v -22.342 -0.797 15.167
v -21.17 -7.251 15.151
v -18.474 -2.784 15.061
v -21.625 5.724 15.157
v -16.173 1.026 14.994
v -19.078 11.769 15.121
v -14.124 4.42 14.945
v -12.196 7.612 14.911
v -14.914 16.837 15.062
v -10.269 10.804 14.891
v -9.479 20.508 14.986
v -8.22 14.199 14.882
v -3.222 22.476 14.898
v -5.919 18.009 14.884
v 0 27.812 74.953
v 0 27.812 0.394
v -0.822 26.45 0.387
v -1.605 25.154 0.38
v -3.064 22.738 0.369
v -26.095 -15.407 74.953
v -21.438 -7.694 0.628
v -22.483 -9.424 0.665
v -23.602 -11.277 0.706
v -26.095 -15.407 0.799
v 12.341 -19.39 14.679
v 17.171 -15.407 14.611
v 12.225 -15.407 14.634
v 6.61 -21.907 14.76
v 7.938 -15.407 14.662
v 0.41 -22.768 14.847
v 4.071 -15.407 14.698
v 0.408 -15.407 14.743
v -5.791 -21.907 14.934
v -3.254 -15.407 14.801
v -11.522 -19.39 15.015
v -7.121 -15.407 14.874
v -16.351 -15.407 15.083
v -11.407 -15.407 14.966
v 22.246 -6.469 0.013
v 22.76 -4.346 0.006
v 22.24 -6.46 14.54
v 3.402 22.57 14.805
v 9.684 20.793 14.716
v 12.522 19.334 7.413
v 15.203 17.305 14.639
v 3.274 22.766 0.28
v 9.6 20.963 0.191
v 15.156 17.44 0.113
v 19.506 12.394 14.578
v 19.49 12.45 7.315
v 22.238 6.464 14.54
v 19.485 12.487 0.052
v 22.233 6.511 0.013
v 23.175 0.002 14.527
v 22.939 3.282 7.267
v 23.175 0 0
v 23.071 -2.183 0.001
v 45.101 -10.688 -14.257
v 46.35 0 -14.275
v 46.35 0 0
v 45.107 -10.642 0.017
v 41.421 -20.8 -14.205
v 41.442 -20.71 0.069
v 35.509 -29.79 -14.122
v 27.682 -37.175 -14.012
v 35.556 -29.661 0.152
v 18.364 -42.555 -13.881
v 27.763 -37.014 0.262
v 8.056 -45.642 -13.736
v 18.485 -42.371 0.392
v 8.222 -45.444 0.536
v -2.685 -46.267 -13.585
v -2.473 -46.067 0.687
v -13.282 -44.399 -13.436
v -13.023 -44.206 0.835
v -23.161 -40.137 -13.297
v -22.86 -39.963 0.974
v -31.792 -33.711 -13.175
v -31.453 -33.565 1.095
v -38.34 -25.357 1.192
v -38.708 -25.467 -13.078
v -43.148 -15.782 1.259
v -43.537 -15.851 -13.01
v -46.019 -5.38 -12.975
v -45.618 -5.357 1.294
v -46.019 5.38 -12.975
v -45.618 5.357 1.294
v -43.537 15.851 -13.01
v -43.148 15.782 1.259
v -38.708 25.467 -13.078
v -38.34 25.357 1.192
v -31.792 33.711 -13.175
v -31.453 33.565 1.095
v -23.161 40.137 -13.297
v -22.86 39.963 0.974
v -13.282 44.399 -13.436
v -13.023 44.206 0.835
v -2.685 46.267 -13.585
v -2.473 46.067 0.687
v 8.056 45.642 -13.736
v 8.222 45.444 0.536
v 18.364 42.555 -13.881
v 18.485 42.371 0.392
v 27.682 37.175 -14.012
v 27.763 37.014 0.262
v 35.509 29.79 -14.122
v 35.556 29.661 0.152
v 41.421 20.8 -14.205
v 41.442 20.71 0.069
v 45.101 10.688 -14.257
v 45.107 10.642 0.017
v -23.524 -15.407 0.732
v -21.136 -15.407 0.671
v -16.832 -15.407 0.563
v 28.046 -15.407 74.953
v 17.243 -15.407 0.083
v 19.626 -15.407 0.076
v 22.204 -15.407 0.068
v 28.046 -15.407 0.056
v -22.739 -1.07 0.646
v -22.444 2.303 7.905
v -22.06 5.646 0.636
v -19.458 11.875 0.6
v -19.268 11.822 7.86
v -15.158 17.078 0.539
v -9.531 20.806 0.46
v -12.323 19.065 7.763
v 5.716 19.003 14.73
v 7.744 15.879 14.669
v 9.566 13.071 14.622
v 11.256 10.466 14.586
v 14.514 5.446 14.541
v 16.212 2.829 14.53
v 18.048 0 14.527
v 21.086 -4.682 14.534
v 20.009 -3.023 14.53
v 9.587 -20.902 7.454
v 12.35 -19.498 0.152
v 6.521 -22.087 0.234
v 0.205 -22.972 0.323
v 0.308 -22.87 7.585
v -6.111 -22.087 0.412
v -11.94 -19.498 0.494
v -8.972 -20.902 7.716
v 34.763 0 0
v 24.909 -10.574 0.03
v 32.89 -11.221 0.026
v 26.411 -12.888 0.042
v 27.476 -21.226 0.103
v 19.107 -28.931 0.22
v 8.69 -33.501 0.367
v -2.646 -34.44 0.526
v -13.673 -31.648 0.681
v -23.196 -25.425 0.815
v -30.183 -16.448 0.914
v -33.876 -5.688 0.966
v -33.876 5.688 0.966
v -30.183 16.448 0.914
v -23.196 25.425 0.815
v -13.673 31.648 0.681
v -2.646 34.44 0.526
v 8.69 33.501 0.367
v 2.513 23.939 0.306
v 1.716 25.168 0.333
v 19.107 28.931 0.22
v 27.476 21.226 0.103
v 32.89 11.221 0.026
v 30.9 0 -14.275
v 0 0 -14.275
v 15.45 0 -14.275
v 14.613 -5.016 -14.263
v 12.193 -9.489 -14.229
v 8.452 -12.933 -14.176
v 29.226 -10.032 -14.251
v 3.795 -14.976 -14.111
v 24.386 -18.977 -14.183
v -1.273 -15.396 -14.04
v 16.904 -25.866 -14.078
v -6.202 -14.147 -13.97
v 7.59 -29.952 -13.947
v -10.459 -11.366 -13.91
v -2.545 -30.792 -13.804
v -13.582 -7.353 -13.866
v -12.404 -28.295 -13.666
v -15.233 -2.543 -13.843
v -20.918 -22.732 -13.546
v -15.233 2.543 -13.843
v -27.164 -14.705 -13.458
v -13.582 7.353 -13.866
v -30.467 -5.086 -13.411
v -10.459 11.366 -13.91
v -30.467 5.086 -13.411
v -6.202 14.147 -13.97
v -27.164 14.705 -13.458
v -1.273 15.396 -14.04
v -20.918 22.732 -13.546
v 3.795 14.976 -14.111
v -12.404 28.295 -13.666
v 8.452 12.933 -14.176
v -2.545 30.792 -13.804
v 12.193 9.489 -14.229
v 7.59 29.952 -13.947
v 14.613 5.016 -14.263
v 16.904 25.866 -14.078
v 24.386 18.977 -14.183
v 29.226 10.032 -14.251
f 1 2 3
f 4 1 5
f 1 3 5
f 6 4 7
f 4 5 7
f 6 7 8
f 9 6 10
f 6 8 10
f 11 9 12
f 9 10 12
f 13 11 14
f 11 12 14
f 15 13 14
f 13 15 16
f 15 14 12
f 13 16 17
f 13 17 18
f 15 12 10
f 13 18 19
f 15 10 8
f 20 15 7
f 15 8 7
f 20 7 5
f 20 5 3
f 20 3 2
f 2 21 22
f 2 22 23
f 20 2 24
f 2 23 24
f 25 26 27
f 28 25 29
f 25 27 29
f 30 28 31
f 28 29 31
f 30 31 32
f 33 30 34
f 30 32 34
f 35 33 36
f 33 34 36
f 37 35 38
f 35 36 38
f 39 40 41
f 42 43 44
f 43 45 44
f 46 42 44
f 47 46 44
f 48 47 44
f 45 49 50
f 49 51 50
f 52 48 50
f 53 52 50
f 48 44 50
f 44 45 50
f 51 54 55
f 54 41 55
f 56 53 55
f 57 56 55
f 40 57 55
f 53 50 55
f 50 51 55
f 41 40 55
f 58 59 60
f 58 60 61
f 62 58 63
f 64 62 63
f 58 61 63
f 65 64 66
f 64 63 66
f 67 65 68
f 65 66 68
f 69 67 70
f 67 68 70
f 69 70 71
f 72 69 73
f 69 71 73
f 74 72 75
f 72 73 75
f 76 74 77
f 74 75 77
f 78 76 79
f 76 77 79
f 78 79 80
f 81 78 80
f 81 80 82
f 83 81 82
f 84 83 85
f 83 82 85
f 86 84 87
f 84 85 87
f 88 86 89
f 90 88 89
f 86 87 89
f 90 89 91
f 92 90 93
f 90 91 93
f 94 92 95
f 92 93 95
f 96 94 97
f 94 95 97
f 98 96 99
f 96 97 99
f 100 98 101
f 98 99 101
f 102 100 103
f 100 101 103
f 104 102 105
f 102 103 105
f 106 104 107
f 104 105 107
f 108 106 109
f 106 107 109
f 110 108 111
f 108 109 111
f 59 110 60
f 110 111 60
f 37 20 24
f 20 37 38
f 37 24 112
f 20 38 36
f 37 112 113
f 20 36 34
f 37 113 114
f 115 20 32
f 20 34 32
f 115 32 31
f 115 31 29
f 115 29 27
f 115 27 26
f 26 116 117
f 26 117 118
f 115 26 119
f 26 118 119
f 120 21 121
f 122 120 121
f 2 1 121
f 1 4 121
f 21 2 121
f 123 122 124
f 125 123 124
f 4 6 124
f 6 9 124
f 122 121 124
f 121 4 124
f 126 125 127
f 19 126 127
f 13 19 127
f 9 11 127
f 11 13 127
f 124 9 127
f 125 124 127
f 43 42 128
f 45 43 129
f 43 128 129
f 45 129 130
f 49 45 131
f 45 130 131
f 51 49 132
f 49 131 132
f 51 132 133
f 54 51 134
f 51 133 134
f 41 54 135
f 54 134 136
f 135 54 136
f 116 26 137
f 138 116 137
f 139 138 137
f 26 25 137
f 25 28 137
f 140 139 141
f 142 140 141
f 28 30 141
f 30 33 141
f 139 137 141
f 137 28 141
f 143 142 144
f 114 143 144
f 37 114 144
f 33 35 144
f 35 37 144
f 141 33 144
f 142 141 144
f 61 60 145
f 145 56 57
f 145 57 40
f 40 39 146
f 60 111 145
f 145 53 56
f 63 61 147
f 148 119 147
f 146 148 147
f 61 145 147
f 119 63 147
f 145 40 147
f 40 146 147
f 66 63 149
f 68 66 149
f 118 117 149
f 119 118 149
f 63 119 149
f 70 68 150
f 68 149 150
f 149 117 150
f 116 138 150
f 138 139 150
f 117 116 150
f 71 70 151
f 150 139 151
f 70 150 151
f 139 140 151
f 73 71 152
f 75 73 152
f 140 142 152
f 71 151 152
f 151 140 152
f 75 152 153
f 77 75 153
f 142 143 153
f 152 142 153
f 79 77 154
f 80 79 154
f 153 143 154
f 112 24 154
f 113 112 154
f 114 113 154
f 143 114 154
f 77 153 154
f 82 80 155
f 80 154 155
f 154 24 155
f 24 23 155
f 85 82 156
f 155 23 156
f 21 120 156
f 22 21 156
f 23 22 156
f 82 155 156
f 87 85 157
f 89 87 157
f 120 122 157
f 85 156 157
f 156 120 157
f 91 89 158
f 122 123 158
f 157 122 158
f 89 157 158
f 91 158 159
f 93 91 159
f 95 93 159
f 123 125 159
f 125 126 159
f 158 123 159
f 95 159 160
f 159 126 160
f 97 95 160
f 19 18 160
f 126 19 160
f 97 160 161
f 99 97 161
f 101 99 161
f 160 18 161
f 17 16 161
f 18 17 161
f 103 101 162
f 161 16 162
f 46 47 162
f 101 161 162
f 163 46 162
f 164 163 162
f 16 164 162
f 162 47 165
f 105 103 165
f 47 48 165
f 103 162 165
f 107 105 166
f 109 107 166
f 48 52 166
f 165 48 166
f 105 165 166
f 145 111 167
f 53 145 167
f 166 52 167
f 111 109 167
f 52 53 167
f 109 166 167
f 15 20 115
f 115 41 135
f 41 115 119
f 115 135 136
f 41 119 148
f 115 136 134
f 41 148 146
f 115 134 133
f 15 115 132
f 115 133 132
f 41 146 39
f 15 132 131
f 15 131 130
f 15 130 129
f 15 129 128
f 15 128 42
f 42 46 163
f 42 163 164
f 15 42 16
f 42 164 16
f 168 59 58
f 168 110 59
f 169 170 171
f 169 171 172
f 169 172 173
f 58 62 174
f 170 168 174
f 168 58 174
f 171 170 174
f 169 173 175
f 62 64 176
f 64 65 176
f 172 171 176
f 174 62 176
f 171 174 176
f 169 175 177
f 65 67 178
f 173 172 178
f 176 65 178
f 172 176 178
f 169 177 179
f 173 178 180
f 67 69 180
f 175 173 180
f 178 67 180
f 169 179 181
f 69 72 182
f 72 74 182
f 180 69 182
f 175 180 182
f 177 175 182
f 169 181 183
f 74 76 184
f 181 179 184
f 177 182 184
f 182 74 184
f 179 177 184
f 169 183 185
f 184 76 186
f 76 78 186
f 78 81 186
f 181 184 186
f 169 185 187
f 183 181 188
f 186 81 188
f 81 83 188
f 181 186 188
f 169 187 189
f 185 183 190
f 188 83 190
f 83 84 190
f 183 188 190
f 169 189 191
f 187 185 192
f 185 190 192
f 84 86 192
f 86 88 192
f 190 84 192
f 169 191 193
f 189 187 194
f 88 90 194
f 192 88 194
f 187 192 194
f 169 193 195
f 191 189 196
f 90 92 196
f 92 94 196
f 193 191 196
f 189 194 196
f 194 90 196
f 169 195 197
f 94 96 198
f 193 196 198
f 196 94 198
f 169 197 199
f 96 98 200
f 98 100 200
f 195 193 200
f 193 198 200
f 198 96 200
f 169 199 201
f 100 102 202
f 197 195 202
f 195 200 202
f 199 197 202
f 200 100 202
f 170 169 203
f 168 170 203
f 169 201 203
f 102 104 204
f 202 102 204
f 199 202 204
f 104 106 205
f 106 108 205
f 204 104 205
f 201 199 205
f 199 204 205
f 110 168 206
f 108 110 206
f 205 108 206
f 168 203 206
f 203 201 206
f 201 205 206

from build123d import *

# Parameters (mm, degrees)
F3_DEPTH = 74.9529767781


with BuildPart() as f1:
    # F0 (on Front) → F1 (revolve)
    with BuildSketch(Plane.XZ):
        Polygon((0.4052141029, 14.5266056061), (0.2008356291, 0), (23.175150156, 0), (23.175150156, 14.5266056061), (11.587575078, 14.5266056061), align=None)
        Polygon((0.2008356291, 0), (0, -14.2747908831), (46.350300312, -14.2747908831), (46.350300312, 0), (23.175150156, 0), align=None)
        Polygon((0.9806752205, 55.4286465049), (0.4052141029, 14.5266056061), (11.587575078, 14.5266056061), (11.9791924953, 55.4286465049), align=None)
    revolve(axis=Axis((0.4903376102, 0, 20.5769278109), (-0.0140678597, 0, -0.9999010428)))

    # F2 (on Top) → F3 (join)
    with BuildSketch(Plane.XY):
        Polygon((-26.0949339381, -15.407031402), (28.0455284658, -15.407031402), (0, 27.8120934963), align=None)
    extrude(amount=F3_DEPTH)


solid = f1.part
